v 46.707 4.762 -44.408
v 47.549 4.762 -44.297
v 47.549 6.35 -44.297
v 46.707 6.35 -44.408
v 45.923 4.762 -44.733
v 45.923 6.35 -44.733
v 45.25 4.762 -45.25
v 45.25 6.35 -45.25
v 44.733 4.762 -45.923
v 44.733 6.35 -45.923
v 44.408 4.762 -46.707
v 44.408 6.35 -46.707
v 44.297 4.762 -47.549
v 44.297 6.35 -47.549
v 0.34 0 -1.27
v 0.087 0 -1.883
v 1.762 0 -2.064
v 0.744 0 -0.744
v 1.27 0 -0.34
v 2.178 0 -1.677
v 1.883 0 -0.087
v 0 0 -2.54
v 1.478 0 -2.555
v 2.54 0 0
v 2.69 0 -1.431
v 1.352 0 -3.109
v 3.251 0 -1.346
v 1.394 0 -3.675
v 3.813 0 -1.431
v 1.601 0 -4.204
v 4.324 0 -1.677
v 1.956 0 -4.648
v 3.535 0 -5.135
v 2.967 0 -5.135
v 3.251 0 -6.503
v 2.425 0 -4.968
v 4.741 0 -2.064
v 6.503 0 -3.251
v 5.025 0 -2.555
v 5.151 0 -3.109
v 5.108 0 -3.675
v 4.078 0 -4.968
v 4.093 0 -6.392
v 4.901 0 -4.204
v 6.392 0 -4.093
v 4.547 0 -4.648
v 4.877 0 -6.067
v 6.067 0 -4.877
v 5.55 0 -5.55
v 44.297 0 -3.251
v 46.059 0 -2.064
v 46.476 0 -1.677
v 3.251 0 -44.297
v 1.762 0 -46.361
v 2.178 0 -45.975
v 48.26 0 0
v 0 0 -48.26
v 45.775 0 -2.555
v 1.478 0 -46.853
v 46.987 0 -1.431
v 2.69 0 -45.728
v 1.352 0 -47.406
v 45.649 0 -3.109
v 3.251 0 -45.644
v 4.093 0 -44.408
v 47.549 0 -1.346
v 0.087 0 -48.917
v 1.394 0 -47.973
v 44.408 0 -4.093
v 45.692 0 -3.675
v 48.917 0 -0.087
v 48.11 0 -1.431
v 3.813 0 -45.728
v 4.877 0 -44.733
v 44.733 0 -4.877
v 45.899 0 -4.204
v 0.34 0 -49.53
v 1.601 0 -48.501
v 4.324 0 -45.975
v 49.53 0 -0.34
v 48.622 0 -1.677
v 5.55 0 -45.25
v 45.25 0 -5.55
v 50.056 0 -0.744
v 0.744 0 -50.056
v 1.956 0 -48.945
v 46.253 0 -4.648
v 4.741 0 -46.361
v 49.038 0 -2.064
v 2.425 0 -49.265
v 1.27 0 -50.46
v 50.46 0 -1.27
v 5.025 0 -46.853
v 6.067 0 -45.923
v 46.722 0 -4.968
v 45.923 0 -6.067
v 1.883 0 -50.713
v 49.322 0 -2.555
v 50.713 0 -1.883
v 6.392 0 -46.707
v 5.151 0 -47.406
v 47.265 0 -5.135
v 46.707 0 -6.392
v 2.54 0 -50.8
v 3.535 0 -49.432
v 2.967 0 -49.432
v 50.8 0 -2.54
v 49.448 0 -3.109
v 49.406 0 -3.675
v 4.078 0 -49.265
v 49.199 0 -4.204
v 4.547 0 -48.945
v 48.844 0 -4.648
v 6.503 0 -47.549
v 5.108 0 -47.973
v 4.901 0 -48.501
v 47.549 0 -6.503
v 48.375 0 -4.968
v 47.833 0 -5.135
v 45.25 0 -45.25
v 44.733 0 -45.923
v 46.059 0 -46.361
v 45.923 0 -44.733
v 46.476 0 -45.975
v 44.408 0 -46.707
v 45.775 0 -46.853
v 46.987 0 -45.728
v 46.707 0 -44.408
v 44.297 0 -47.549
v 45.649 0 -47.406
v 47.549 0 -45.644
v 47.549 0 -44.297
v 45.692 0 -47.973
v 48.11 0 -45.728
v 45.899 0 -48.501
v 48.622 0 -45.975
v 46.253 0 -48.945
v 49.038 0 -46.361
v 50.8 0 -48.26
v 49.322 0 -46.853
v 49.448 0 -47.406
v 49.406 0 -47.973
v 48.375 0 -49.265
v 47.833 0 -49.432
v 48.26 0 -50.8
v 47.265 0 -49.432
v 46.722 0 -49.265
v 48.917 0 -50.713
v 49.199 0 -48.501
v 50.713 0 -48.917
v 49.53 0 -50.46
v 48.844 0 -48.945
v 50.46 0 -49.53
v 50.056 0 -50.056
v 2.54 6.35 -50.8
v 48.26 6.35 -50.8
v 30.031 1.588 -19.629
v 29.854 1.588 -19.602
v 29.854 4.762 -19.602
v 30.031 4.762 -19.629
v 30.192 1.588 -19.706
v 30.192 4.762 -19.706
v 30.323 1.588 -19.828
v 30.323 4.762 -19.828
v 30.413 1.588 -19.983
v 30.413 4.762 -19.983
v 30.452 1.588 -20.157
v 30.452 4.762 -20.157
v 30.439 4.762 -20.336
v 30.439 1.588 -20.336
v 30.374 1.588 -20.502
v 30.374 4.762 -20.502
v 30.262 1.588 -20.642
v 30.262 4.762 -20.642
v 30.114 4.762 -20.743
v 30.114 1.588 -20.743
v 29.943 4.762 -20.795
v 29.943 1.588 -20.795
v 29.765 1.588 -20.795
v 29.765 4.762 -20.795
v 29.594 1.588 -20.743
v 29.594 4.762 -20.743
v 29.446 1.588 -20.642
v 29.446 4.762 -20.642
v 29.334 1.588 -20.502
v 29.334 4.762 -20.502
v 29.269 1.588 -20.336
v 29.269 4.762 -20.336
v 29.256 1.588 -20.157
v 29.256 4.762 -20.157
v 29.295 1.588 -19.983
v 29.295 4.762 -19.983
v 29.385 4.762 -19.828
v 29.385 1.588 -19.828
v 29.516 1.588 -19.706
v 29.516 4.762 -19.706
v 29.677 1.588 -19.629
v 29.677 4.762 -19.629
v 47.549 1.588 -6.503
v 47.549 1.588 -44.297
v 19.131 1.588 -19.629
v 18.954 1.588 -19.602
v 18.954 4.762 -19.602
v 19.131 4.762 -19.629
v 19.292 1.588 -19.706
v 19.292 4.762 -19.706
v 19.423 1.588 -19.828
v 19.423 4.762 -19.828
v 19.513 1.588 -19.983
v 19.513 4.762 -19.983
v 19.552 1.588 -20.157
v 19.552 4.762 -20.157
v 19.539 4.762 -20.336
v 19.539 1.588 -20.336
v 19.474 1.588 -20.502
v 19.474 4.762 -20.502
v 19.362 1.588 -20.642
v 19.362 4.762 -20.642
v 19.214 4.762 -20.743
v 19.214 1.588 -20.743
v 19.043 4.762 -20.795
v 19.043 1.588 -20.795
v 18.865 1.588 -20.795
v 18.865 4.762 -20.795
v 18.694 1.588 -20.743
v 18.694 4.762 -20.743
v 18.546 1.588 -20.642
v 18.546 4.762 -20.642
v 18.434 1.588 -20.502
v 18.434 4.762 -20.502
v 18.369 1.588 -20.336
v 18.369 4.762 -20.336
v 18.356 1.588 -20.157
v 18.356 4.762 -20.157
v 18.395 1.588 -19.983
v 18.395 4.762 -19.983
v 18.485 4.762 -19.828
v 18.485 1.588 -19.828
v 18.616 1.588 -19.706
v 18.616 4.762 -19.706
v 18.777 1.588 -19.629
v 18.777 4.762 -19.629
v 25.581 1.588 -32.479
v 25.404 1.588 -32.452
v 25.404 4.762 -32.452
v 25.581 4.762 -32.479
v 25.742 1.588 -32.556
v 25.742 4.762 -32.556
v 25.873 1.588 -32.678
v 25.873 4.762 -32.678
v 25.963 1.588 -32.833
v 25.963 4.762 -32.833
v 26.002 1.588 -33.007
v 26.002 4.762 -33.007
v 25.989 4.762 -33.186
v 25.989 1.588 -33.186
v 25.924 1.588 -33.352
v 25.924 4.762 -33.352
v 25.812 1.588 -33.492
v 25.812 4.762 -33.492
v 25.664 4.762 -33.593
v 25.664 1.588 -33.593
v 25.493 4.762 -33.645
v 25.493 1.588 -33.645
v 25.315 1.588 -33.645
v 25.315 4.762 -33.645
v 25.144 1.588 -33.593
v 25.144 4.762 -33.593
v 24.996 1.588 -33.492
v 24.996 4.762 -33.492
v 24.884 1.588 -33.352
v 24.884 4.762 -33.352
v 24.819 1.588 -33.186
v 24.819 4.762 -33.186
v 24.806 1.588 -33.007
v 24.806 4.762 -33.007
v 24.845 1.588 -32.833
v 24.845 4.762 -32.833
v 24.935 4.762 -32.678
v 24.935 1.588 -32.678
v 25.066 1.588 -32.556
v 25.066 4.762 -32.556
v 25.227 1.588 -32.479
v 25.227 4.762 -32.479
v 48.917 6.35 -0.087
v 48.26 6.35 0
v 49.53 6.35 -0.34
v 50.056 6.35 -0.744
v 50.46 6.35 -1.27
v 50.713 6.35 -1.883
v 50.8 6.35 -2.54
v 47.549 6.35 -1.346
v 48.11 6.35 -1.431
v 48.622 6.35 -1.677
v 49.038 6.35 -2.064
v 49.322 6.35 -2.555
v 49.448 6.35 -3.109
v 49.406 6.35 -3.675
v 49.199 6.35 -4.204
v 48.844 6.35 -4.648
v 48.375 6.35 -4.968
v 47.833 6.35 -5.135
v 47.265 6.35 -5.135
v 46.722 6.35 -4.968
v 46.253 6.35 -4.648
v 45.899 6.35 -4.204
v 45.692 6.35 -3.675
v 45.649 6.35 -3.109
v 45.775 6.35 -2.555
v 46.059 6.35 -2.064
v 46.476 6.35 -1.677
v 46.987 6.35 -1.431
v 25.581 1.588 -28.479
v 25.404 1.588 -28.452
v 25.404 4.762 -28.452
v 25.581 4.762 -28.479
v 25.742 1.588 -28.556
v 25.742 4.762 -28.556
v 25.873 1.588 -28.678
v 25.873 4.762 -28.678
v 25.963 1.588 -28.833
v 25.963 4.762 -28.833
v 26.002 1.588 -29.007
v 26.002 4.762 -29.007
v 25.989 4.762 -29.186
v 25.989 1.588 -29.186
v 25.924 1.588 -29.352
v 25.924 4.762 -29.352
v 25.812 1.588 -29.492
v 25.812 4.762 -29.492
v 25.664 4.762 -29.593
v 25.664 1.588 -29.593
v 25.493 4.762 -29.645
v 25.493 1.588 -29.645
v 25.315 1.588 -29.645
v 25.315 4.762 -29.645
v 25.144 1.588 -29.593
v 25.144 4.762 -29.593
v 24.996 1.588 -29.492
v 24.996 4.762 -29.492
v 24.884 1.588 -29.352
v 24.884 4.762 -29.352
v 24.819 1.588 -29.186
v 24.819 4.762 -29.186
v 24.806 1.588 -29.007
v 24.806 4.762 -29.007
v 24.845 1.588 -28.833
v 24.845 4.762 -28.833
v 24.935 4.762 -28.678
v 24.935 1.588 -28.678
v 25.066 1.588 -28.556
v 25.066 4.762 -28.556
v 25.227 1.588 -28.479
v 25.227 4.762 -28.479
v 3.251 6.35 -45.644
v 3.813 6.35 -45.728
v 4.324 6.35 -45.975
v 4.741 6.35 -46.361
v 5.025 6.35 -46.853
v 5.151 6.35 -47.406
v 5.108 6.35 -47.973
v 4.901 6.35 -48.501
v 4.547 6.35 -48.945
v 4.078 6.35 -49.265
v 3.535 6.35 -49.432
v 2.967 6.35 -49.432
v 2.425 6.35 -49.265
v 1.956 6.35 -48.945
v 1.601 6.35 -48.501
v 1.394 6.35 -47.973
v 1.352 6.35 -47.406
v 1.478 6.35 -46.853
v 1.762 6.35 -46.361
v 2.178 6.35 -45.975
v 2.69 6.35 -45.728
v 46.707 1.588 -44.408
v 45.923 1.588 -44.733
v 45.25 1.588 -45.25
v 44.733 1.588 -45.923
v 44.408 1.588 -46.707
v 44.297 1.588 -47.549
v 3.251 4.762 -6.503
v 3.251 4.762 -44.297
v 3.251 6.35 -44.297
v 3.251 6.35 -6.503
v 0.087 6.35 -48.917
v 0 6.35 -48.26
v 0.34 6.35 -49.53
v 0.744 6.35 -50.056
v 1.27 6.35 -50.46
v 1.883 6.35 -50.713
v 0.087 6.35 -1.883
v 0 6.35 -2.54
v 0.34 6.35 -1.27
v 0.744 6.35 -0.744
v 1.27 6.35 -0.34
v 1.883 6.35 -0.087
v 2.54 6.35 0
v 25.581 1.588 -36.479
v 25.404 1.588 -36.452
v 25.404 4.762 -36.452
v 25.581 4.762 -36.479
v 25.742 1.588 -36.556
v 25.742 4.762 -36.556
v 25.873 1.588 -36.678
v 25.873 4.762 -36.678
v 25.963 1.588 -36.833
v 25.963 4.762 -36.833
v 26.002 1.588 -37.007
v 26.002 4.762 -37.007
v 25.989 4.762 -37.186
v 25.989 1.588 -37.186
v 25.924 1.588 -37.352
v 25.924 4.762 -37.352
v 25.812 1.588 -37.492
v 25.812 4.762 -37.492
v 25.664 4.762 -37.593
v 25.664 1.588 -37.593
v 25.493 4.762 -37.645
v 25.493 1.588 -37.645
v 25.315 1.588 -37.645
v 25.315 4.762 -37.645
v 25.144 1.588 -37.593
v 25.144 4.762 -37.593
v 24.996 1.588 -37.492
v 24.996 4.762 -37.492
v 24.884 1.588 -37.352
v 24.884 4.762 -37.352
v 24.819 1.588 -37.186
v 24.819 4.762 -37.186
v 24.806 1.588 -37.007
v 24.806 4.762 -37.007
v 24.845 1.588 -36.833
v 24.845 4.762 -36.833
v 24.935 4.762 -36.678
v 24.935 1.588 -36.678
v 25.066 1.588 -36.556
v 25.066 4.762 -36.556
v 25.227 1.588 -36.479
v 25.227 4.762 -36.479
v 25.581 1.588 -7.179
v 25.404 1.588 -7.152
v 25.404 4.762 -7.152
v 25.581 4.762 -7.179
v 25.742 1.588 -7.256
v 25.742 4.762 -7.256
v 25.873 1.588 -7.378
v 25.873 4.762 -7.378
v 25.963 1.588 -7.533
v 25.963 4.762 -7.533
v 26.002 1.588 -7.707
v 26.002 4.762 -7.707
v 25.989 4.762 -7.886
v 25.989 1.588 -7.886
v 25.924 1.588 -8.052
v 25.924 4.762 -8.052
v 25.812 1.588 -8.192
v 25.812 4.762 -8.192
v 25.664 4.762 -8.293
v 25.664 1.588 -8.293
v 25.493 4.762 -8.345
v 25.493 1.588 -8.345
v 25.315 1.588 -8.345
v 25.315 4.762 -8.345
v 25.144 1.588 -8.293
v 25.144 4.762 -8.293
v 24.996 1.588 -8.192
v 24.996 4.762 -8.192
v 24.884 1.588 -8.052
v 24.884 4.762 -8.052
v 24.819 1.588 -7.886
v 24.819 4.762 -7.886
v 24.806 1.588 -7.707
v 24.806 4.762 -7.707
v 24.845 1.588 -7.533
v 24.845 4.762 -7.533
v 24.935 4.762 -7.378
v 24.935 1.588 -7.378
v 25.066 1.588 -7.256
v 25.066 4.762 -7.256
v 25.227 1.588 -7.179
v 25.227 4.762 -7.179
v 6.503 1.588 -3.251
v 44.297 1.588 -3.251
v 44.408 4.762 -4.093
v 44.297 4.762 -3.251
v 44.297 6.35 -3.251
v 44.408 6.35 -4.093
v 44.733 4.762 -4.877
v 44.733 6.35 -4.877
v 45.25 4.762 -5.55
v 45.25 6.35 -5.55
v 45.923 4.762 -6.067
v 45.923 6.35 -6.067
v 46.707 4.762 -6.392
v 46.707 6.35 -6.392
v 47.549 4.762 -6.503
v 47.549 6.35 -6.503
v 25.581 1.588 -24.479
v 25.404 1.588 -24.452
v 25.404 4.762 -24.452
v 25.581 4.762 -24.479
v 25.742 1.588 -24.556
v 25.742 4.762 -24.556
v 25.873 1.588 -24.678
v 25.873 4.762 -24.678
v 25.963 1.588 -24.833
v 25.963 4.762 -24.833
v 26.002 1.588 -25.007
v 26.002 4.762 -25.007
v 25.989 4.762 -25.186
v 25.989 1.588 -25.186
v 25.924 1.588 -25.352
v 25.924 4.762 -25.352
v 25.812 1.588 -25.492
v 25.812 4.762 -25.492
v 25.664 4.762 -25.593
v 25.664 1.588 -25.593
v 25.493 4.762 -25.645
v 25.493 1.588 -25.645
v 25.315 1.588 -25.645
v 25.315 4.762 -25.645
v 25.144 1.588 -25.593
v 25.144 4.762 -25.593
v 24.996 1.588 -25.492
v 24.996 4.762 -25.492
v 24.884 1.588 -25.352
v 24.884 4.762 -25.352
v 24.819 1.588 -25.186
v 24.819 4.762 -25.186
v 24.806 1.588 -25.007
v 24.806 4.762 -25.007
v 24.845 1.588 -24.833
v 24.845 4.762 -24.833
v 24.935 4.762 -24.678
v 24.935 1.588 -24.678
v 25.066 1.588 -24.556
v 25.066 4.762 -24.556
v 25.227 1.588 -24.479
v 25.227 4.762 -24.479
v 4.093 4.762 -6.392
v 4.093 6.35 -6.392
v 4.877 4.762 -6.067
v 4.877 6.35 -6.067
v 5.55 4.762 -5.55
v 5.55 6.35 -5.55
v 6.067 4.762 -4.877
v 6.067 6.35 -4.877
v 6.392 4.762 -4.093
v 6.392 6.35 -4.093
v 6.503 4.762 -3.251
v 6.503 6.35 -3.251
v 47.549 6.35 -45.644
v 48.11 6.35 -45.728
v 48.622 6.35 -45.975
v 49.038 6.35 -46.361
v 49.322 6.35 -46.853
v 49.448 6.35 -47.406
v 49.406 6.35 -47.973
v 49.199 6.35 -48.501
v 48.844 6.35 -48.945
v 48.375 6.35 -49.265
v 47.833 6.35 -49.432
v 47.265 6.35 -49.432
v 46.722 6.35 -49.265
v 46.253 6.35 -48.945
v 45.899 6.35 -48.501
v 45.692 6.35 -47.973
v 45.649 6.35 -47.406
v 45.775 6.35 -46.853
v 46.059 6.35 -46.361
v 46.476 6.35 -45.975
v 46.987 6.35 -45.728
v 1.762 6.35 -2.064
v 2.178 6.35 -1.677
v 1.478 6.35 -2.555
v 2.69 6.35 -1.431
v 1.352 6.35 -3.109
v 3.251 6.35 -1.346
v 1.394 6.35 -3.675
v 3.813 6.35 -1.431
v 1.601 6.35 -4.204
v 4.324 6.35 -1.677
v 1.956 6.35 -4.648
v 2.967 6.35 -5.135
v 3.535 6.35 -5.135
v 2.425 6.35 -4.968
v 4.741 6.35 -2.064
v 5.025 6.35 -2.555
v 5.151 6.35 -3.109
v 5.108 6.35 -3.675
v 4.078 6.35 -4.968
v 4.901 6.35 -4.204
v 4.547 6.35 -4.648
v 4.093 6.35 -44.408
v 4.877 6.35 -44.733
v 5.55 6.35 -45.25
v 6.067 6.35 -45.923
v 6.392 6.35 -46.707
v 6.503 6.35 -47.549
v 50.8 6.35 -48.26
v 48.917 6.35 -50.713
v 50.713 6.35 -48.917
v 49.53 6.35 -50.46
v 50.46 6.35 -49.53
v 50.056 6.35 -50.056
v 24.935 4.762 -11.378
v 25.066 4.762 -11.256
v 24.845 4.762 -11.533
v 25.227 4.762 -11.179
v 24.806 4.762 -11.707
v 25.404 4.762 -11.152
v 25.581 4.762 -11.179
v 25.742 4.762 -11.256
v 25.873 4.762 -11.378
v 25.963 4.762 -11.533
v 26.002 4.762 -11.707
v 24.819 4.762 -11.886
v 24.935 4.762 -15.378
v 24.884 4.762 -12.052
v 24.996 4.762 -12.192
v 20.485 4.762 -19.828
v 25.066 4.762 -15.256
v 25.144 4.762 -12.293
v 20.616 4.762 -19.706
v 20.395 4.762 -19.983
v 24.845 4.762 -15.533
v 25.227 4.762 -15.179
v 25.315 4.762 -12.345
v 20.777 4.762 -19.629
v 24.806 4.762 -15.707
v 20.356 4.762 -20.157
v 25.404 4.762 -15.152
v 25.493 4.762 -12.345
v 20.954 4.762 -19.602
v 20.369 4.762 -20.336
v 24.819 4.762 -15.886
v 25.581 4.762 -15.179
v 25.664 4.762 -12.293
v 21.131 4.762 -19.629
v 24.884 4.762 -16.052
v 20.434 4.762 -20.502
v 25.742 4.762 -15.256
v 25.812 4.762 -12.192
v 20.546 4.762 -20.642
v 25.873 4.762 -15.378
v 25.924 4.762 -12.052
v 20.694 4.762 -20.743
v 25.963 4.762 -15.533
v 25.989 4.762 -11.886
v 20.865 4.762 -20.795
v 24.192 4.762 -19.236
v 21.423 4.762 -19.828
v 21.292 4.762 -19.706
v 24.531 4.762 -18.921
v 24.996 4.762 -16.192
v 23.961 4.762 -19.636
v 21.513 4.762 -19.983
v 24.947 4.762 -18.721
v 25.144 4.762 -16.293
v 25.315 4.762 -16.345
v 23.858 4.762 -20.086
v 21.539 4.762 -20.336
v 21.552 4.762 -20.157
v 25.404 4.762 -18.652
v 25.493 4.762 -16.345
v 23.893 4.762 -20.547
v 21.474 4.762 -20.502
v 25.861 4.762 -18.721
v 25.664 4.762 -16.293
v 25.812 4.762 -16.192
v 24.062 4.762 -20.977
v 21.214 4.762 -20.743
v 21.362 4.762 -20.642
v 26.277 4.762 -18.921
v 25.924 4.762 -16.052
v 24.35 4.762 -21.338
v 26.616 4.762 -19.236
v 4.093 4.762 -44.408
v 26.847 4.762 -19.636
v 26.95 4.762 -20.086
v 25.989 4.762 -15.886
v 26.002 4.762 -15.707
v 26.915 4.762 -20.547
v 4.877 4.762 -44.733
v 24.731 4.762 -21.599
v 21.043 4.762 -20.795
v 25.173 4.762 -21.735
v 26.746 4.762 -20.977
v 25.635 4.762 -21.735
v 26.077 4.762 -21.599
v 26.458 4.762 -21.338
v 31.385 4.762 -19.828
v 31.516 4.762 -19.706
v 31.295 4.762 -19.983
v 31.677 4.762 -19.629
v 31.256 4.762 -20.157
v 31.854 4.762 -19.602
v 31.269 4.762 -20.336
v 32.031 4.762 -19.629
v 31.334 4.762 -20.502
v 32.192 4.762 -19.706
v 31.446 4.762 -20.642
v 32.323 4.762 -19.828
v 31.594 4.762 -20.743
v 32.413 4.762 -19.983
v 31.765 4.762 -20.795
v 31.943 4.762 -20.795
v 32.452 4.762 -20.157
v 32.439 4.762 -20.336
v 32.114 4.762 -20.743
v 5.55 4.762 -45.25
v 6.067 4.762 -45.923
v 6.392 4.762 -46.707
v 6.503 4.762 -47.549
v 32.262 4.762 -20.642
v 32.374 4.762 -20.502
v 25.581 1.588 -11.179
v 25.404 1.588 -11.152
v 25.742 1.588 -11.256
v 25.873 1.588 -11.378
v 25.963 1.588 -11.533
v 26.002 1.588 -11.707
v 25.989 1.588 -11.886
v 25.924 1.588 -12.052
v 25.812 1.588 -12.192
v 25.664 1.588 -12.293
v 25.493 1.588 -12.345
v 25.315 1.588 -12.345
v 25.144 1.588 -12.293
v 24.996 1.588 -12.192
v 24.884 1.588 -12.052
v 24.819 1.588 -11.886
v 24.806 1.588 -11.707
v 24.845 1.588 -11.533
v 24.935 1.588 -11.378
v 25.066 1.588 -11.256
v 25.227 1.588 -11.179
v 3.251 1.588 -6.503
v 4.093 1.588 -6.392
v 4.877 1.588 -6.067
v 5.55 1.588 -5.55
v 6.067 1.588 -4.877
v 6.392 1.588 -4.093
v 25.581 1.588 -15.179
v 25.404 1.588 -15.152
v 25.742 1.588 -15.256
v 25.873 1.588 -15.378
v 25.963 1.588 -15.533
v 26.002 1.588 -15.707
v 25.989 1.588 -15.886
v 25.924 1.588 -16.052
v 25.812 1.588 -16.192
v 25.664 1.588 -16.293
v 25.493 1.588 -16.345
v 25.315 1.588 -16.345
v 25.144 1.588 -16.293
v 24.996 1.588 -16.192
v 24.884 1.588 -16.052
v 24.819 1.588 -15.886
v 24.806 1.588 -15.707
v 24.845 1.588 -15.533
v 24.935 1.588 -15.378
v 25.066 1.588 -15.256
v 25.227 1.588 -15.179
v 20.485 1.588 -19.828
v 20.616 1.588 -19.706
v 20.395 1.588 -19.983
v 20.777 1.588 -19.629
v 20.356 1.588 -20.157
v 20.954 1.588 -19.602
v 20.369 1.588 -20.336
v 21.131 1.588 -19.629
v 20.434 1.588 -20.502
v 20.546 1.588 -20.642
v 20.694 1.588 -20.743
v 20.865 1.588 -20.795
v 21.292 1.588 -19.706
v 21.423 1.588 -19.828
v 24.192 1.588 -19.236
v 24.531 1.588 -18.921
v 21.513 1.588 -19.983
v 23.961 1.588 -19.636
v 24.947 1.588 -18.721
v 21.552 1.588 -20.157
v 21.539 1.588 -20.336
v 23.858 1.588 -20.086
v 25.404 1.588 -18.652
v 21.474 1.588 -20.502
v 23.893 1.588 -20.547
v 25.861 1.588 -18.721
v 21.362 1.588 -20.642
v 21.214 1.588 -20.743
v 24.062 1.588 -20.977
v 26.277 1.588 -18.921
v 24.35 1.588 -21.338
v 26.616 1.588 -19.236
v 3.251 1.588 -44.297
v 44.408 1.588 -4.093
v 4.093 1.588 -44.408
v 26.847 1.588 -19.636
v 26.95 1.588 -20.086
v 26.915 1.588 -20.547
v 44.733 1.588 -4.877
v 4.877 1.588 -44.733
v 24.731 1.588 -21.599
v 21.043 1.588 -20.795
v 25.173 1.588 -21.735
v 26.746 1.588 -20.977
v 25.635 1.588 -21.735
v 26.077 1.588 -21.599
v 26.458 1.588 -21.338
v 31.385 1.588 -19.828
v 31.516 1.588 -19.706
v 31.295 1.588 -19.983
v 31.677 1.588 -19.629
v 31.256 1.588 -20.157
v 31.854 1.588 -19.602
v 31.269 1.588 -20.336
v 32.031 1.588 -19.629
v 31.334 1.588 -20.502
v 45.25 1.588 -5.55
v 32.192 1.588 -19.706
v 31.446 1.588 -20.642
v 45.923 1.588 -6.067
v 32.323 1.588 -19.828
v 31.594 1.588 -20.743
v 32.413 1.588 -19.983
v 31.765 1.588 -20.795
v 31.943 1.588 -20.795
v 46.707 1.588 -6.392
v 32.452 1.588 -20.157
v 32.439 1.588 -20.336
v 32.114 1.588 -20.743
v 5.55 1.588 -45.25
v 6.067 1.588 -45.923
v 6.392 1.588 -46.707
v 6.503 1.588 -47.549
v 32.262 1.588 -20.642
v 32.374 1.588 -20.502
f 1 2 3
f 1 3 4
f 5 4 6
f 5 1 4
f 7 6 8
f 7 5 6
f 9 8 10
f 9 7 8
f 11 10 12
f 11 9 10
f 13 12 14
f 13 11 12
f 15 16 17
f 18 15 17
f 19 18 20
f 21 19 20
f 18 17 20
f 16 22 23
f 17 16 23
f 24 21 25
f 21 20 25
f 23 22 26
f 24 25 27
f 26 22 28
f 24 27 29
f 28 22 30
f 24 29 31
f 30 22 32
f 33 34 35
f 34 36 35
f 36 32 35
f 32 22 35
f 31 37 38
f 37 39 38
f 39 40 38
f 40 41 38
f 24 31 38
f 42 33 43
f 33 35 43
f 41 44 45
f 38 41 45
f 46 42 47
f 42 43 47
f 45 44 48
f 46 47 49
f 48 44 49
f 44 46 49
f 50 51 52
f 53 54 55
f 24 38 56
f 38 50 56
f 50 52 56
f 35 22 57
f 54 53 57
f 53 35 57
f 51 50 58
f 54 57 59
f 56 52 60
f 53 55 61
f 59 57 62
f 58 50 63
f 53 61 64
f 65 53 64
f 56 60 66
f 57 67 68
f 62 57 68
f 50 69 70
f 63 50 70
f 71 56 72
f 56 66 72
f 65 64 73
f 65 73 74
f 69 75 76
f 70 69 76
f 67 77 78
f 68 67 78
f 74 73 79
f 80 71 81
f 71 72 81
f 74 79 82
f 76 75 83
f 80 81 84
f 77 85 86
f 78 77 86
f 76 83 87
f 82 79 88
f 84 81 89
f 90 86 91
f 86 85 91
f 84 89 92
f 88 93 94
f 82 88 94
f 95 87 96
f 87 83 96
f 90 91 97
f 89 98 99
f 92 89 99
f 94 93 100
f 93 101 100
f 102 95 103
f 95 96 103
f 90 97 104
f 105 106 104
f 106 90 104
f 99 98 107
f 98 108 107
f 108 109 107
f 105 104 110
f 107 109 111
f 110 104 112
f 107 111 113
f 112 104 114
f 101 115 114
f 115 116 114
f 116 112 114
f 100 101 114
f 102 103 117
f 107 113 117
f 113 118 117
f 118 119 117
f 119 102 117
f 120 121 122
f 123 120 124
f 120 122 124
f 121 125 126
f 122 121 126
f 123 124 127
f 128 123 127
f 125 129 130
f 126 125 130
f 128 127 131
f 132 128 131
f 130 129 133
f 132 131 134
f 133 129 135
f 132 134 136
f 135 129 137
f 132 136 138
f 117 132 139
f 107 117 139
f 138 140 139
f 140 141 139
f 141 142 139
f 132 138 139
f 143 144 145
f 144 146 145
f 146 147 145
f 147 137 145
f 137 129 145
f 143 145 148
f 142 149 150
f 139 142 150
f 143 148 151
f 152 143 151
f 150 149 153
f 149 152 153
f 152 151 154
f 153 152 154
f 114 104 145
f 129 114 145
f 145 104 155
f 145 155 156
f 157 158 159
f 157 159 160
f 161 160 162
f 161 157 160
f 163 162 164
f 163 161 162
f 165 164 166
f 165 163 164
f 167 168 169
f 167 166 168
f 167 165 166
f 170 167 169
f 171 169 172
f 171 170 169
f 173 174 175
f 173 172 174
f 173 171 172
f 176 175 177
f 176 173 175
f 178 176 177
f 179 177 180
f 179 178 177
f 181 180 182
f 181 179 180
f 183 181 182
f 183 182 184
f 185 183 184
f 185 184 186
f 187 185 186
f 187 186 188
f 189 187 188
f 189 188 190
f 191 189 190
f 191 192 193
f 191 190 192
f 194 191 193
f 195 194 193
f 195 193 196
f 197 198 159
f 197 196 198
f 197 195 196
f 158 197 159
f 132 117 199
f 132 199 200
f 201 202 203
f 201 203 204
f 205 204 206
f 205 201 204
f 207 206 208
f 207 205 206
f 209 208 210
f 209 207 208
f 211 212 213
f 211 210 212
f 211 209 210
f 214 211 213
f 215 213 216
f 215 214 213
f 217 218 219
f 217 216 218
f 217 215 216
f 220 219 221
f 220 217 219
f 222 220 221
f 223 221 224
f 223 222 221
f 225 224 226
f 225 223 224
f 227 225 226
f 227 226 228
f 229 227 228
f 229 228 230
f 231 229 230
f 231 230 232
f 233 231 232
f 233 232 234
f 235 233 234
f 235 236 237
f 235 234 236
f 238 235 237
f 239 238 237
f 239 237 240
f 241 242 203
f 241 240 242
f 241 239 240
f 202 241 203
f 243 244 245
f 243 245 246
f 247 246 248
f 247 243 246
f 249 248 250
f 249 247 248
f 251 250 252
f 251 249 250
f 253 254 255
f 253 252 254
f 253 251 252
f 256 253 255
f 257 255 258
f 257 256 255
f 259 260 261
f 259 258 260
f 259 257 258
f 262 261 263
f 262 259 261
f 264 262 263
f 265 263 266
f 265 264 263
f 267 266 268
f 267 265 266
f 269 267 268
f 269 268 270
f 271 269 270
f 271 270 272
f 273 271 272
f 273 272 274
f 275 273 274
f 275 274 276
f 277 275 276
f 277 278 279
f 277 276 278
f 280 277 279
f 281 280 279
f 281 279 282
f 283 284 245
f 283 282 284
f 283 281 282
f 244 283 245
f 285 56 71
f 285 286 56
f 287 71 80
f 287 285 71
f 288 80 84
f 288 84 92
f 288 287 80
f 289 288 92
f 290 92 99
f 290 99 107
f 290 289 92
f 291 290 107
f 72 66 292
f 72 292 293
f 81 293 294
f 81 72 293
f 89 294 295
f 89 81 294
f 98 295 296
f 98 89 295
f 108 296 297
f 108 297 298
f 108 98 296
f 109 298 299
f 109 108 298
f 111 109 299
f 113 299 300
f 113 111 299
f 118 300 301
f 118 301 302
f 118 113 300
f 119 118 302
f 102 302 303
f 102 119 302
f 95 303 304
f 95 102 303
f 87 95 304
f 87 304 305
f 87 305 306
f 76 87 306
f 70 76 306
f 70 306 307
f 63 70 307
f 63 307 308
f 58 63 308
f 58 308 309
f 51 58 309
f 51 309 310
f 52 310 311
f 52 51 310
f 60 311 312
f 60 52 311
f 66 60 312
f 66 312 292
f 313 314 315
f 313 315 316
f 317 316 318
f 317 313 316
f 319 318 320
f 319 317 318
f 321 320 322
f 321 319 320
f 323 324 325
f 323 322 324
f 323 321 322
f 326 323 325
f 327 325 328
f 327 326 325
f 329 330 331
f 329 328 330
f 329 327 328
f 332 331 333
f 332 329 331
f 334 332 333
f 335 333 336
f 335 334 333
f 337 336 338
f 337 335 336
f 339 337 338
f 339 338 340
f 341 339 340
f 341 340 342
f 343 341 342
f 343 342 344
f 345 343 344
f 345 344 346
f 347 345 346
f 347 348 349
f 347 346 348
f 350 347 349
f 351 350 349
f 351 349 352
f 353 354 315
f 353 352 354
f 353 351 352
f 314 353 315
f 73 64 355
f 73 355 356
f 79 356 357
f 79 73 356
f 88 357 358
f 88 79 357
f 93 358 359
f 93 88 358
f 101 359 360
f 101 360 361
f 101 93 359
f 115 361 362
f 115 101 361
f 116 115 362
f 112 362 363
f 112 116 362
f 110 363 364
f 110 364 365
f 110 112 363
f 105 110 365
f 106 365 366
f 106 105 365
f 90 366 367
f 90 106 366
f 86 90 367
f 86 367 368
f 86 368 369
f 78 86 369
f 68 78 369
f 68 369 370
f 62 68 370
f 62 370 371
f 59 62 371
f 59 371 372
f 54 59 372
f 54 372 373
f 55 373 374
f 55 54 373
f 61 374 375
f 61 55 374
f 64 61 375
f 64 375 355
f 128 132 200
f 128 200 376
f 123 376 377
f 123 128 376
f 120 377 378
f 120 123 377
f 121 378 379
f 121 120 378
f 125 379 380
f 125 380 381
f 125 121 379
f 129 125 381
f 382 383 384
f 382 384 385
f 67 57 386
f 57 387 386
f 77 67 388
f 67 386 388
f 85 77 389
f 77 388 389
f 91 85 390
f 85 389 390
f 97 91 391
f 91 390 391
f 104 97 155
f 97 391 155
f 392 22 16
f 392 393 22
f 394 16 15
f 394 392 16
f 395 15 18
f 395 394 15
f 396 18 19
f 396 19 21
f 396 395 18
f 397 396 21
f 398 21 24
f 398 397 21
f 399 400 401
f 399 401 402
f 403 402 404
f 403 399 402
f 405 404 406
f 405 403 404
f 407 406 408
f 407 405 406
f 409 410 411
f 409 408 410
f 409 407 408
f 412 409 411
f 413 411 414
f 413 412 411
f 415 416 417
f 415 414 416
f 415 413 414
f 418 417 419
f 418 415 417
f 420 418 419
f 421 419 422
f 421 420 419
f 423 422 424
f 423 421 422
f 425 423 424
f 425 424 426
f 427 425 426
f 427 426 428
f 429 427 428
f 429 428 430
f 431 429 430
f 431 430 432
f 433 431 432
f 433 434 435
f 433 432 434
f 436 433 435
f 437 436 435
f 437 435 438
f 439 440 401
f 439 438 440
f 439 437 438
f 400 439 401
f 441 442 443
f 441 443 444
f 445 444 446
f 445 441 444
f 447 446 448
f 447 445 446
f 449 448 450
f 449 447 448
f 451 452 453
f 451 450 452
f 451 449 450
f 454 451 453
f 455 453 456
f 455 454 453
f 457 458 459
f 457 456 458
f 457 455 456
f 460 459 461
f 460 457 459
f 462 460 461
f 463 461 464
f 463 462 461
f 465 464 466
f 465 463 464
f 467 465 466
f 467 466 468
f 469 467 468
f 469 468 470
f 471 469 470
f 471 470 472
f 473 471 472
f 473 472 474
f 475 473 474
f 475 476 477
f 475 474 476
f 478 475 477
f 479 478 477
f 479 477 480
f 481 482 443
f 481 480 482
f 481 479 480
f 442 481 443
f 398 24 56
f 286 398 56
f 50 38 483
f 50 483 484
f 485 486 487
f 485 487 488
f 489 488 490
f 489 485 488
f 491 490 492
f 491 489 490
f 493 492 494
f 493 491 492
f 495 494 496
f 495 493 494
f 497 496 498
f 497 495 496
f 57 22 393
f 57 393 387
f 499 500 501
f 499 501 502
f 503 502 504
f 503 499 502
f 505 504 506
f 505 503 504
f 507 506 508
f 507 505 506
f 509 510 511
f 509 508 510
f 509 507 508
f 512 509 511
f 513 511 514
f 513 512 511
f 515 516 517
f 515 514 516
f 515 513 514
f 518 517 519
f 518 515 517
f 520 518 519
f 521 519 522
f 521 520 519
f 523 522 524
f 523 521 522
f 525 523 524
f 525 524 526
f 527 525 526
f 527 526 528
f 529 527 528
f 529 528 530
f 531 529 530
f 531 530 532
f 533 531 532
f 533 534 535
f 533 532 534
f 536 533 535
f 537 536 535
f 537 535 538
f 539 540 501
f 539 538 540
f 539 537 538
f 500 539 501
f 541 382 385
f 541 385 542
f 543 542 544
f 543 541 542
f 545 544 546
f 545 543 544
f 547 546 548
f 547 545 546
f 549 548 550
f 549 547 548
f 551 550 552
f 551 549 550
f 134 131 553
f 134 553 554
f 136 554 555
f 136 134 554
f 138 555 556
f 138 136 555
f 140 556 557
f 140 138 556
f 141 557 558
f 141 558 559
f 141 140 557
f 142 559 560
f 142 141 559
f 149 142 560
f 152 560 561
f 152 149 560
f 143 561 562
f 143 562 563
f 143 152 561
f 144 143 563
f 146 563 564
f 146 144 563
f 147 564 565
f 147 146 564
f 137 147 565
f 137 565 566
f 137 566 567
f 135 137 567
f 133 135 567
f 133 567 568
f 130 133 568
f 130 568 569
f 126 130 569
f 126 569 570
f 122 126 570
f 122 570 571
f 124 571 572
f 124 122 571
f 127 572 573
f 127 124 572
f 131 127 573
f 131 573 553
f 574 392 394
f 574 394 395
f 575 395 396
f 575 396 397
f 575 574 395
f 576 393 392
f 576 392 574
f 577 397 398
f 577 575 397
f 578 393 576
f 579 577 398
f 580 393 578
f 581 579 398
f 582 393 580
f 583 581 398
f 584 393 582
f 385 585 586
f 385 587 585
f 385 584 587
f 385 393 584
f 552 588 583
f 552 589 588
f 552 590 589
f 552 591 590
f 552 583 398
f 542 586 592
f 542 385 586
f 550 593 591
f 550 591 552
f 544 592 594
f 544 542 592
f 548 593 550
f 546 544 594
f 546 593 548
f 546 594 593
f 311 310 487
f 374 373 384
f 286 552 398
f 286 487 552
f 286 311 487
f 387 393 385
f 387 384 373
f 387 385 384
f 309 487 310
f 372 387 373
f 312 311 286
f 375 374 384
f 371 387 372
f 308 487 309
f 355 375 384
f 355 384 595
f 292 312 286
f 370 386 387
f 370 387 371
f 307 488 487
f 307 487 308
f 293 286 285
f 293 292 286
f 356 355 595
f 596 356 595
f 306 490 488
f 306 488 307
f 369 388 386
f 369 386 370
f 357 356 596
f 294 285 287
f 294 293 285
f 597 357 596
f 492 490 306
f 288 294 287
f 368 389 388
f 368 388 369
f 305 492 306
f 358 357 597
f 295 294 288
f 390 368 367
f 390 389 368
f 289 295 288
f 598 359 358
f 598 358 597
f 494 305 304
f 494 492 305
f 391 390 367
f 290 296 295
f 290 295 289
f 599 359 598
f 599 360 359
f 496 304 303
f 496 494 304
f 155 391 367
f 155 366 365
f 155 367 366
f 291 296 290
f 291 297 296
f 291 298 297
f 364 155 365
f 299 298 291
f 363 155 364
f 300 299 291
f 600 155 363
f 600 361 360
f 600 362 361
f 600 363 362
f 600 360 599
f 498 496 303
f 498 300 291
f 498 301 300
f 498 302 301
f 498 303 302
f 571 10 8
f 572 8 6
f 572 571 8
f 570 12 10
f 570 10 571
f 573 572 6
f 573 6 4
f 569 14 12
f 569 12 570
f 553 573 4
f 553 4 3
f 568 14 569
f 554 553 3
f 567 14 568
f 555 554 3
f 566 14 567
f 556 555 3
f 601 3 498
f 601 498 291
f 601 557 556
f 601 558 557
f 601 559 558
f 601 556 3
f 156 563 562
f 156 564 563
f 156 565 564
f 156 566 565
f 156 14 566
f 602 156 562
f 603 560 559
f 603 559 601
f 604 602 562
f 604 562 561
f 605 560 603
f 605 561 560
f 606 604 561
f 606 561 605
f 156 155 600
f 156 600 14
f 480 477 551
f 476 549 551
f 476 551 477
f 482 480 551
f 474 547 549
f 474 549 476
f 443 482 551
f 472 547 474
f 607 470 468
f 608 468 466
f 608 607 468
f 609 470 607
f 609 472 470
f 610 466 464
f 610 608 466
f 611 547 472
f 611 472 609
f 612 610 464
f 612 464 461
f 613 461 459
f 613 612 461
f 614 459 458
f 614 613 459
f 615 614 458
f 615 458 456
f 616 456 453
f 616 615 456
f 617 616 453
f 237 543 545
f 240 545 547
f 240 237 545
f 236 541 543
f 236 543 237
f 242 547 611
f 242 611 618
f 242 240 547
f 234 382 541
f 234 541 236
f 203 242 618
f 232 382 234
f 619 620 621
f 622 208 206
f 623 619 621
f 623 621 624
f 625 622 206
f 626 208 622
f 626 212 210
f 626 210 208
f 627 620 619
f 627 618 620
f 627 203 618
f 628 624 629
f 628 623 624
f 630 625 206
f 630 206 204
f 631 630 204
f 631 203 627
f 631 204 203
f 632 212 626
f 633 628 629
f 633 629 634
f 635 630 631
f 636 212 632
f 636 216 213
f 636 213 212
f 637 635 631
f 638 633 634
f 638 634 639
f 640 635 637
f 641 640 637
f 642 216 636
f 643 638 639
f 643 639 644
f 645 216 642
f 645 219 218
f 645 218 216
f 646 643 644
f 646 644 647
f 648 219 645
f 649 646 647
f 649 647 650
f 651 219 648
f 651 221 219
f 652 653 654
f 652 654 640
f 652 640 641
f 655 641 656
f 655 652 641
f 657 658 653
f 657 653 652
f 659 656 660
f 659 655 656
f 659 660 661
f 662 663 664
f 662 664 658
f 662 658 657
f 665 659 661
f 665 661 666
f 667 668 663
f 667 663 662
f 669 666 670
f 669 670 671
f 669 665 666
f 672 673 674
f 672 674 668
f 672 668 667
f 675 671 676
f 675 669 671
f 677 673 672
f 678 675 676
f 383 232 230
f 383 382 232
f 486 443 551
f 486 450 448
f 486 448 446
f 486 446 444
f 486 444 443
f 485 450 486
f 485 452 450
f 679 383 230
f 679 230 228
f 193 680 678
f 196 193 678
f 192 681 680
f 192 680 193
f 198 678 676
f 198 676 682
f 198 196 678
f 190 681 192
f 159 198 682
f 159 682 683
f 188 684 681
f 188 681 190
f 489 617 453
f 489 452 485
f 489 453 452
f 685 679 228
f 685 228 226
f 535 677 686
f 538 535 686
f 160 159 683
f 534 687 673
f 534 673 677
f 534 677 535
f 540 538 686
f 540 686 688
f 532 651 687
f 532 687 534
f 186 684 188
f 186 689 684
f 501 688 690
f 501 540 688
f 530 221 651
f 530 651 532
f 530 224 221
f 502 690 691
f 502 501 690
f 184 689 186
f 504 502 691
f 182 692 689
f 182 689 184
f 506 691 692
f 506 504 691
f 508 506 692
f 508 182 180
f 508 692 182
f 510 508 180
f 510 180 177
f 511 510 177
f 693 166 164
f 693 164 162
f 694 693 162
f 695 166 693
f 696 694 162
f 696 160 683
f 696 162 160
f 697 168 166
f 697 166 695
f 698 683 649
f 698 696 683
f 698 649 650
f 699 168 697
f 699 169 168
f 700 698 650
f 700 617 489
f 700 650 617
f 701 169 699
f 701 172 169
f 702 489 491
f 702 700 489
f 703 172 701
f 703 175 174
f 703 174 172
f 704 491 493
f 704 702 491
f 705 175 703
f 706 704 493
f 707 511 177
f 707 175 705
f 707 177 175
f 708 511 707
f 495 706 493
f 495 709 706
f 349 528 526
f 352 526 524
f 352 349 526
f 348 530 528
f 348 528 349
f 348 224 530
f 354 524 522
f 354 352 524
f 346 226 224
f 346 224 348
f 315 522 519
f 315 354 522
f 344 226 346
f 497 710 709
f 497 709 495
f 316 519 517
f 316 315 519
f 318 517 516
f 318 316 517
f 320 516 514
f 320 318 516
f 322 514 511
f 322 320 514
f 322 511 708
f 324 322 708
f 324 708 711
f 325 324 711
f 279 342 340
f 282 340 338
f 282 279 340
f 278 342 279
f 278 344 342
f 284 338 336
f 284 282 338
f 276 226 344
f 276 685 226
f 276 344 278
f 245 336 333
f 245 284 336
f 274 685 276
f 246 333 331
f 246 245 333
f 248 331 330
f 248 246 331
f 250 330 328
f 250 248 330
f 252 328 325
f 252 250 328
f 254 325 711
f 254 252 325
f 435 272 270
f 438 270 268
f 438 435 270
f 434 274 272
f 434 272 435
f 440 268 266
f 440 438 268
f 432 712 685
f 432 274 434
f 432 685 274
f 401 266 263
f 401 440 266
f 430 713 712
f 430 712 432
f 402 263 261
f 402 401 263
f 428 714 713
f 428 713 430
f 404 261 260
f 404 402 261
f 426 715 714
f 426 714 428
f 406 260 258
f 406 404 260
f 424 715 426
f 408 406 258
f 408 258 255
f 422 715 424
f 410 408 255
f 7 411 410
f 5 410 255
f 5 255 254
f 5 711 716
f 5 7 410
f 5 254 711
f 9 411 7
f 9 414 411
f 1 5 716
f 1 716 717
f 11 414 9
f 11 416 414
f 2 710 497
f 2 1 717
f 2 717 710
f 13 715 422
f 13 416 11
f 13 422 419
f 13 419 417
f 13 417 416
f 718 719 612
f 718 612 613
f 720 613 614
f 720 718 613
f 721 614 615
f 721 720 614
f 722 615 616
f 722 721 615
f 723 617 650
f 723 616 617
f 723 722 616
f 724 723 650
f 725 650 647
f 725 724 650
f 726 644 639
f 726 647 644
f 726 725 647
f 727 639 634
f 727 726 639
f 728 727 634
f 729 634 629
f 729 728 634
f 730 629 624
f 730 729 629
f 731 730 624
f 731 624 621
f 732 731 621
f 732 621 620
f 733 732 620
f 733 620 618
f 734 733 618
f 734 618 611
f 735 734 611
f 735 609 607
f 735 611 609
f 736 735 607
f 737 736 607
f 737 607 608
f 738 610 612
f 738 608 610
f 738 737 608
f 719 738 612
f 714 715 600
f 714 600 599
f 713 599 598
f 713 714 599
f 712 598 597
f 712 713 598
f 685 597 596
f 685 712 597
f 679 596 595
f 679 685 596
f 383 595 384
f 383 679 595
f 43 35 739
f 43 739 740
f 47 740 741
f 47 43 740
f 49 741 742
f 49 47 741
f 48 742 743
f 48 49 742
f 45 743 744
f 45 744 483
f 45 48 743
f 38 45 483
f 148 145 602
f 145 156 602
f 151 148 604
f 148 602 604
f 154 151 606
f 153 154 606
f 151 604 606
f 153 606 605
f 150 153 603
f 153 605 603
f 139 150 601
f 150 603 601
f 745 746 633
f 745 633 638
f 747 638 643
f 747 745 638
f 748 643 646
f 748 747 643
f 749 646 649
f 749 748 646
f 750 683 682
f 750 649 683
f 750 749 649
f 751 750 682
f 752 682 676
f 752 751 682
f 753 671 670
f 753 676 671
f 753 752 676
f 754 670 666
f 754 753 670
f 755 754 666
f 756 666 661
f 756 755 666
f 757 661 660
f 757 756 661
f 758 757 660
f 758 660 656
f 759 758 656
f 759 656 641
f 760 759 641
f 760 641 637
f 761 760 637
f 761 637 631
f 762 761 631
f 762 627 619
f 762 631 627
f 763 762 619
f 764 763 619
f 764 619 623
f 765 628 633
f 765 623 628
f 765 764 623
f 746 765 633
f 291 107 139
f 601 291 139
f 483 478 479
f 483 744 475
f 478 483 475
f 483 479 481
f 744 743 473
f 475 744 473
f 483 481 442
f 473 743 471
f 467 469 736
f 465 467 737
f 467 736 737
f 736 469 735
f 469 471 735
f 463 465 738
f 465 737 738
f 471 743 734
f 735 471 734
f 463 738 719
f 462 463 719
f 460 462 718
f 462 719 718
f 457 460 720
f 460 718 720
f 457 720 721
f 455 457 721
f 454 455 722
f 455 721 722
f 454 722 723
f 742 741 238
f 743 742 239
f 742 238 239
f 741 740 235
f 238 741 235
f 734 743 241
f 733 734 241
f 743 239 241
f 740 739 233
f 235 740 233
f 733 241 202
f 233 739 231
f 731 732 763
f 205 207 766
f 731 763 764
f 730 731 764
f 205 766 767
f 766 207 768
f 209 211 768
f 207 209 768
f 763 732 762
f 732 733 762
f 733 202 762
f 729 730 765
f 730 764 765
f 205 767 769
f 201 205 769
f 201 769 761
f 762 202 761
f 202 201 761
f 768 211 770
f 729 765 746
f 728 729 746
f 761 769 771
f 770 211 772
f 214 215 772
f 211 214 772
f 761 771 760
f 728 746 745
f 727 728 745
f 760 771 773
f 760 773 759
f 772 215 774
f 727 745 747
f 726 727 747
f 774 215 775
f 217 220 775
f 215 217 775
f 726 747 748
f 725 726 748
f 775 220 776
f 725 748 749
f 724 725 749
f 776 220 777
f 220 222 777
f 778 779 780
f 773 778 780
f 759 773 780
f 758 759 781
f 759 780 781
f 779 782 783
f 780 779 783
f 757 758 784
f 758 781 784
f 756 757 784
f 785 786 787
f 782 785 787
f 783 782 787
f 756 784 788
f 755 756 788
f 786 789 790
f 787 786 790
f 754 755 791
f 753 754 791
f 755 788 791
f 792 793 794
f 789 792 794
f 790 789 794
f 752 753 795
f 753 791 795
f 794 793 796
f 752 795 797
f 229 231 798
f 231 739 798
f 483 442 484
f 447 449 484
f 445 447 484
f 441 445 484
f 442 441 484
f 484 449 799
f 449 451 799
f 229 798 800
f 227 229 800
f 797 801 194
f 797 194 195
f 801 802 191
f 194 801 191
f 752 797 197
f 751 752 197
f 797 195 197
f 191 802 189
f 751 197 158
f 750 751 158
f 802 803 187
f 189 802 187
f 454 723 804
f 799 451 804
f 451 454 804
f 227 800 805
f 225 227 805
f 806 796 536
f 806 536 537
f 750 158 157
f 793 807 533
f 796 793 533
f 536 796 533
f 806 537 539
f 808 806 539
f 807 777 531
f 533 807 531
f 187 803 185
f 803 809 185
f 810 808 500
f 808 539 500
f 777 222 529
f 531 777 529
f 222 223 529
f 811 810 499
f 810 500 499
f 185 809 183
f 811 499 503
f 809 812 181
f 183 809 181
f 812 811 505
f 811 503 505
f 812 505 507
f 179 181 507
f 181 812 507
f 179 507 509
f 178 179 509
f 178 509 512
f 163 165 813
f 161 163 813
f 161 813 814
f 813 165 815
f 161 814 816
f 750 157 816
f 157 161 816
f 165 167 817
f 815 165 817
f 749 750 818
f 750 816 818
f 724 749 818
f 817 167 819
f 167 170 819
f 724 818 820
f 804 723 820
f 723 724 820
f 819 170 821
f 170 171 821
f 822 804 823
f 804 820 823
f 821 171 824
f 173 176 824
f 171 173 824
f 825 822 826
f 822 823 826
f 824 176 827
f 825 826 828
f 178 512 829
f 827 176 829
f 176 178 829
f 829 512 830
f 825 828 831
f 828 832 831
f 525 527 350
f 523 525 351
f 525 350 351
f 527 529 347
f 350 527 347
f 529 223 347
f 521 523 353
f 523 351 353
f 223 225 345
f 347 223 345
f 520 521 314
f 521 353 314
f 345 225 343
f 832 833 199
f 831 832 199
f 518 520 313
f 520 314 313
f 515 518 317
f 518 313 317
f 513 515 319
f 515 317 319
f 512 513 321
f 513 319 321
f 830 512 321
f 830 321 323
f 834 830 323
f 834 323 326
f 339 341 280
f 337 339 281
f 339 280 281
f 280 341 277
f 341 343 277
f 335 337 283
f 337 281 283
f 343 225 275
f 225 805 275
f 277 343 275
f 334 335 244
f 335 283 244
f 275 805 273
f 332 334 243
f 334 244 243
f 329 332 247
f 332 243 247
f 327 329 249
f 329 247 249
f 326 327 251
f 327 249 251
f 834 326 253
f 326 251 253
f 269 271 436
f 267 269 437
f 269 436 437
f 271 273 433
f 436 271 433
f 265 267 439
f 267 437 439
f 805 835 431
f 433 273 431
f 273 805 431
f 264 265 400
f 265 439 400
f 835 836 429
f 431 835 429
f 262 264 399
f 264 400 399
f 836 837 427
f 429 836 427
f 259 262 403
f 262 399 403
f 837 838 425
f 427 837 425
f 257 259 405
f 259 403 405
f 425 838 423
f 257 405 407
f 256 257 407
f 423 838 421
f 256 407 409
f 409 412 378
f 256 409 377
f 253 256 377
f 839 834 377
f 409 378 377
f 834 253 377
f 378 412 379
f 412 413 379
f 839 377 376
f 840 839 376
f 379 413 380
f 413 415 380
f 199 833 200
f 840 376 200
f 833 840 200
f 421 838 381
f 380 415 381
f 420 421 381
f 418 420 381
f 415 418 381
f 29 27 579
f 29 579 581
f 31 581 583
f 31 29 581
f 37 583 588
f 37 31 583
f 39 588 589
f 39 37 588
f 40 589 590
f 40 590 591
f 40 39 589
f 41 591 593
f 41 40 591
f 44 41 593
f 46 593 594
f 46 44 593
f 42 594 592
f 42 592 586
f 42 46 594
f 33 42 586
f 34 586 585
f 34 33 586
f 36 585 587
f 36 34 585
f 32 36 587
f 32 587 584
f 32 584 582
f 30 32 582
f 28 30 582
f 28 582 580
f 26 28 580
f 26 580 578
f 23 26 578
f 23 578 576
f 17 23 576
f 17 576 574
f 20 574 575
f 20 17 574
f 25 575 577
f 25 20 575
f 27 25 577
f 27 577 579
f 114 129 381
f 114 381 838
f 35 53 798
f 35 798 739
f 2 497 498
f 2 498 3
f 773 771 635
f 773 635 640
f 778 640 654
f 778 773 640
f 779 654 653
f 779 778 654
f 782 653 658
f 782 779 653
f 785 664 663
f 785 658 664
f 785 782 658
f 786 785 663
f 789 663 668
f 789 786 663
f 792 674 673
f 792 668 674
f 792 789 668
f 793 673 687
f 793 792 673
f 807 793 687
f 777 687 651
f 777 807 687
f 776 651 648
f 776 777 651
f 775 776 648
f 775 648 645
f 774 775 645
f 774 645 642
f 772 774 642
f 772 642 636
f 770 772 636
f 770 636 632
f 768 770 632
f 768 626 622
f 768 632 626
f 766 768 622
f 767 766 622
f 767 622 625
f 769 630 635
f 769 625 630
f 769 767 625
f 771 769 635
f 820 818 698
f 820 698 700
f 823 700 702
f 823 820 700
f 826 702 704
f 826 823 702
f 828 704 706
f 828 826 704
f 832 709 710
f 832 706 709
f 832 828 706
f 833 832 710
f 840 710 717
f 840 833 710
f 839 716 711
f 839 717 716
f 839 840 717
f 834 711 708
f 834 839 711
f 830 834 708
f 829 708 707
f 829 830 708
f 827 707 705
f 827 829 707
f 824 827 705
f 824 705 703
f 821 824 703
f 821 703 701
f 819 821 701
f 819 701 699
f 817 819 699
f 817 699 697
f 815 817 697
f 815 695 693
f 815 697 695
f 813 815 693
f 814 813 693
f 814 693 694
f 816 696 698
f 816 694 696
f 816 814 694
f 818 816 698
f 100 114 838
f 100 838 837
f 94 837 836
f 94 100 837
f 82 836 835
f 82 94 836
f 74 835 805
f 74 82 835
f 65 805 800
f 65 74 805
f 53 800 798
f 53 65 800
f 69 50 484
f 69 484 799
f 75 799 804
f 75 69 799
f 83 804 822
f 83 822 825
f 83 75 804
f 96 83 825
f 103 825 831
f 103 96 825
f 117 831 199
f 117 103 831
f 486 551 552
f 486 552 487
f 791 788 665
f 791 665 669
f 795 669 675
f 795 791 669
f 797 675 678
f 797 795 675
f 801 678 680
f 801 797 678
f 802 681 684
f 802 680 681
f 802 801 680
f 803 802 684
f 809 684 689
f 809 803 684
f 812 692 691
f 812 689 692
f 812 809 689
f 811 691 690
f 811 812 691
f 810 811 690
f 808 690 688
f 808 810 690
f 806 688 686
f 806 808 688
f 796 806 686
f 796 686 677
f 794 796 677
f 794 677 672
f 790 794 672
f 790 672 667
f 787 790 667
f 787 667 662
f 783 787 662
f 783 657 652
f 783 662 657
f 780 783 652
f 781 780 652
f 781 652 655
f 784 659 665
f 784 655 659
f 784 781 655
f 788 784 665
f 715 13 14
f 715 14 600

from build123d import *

# Parameters (mm, degrees)
SKETCH1_W           = 50.8
SKETCH1_H           = 50.8
SKETCH1_R           = 1.905
SKETCH1_R_2         = 0.6
SKETCH1_R_3         = 1.55
BOSS_EXTRUDE1_DEPTH = 6.35
CUT_EXTRUDE1_DEPTH  = 1.5875
CUT_EXTRUDE2_START  = 4.7625
CUT_EXTRUDE2_DEPTH  = 1.5875
FILLET1_R           = 2.54


with BuildPart() as part:
    # Sketch1 → Boss-Extrude1 (new body)
    with BuildSketch(Plane(origin=(0, 0, 0), x_dir=(1, 0, 0), z_dir=(0, 1, 0))):
        with Locations((25.4, 25.4)):
            Rectangle(SKETCH1_W, SKETCH1_H)
        with Locations(Location((3.251252547, 47.548747453, 0), (0, 0, 270))):
            Circle(SKETCH1_R, mode=Mode.SUBTRACT)
        with Locations(Location((3.251252547, 3.251252547, 0), (0, 0, 270))):
            Circle(SKETCH1_R, mode=Mode.SUBTRACT)
        with Locations(Location((47.548747453, 3.251252547, 0), (0, 0, 270))):
            Circle(SKETCH1_R, mode=Mode.SUBTRACT)
        with Locations(Location((47.548747453, 47.548747453, 0), (0, 0, 270))):
            Circle(SKETCH1_R, mode=Mode.SUBTRACT)
        with Locations(Location((25.404, 11.752, 0), (0, 0, 270))):
            Circle(SKETCH1_R_2, mode=Mode.SUBTRACT)
        with Locations(Location((18.954, 20.202, 0), (0, 0, 270))):
            Circle(SKETCH1_R_2, mode=Mode.SUBTRACT)
        with Locations(Location((20.954, 20.202, 0), (0, 0, 270))):
            Circle(SKETCH1_R_2, mode=Mode.SUBTRACT)
        with Locations(Location((31.854, 20.202, 0), (0, 0, 270))):
            Circle(SKETCH1_R_2, mode=Mode.SUBTRACT)
        with Locations(Location((29.854, 20.202, 0), (0, 0, 270))):
            Circle(SKETCH1_R_2, mode=Mode.SUBTRACT)
        with Locations(Location((25.404, 37.052, 0), (0, 0, 270))):
            Circle(SKETCH1_R_2, mode=Mode.SUBTRACT)
        with Locations(Location((25.404, 33.052, 0), (0, 0, 270))):
            Circle(SKETCH1_R_2, mode=Mode.SUBTRACT)
        with Locations(Location((25.404, 29.052, 0), (0, 0, 270))):
            Circle(SKETCH1_R_2, mode=Mode.SUBTRACT)
        with Locations(Location((25.404, 25.052, 0), (0, 0, 270))):
            Circle(SKETCH1_R_2, mode=Mode.SUBTRACT)
        with Locations(Location((25.404, 7.752, 0), (0, 0, 270))):
            Circle(SKETCH1_R_2, mode=Mode.SUBTRACT)
        with Locations(Location((25.404, 15.752, 0), (0, 0, 270))):
            Circle(SKETCH1_R_2, mode=Mode.SUBTRACT)
        with Locations(Location((25.404, 20.202, 0), (0, 0, 270))):
            Circle(SKETCH1_R_3, mode=Mode.SUBTRACT)
    extrude(amount=BOSS_EXTRUDE1_DEPTH)

    # Sketch2 → Cut-Extrude1 (cut)
    with BuildSketch(Plane(origin=(0, 0, 0), x_dir=(1, 0, 0), z_dir=(0, 1, 0))):
        with BuildLine():
            ThreePointArc((6.502505094, 47.548747453), (5.55023527, 45.24976473), (3.251252547, 44.297494906))
            Line((3.251252547, 44.297494906), (3.251252547, 6.502505094))
            ThreePointArc((3.251252547, 6.502505094), (5.55023527, 5.55023527), (6.502505094, 3.251252547))
            Line((6.502505094, 3.251252547), (44.297494906, 3.251252547))
            ThreePointArc((44.297494906, 3.251252547), (45.24976473, 5.55023527), (47.548747453, 6.502505094))
            Line((47.548747453, 6.502505094), (47.548747453, 44.297494906))
            ThreePointArc((47.548747453, 44.297494906), (45.24976473, 45.24976473), (44.297494906, 47.548747453))
            Line((44.297494906, 47.548747453), (6.502505094, 47.548747453))
        make_face()
    extrude(amount=CUT_EXTRUDE1_DEPTH, mode=Mode.SUBTRACT)

    # Sketch3 → Cut-Extrude2 (cut)
    with BuildSketch(Plane(origin=(0, 0, 0), x_dir=(1, 0, 0), z_dir=(0, 1, 0)).offset(CUT_EXTRUDE2_START)):
        with BuildLine():
            ThreePointArc((6.502505094, 47.548747453), (5.55023527, 45.24976473), (3.251252547, 44.297494906))
            Line((3.251252547, 44.297494906), (3.251252547, 6.502505094))
            ThreePointArc((3.251252547, 6.502505094), (5.55023527, 5.55023527), (6.502505094, 3.251252547))
            Line((6.502505094, 3.251252547), (44.297494906, 3.251252547))
            ThreePointArc((44.297494906, 3.251252547), (45.24976473, 5.55023527), (47.548747453, 6.502505094))
            Line((47.548747453, 6.502505094), (47.548747453, 44.297494906))
            ThreePointArc((47.548747453, 44.297494906), (45.24976473, 45.24976473), (44.297494906, 47.548747453))
            Line((44.297494906, 47.548747453), (6.502505094, 47.548747453))
        make_face()
    extrude(amount=CUT_EXTRUDE2_DEPTH, mode=Mode.SUBTRACT)

    # Fillet1
    fillet1_edges = [part.edges().sort_by_distance(p)[0] for p in [
        (50.8, 3.175, -50.8),
        (50.8, 3.175, 0),
        (0, 3.175, 0),
        (0, 3.175, -50.8),
    ]]
    fillet(fillet1_edges, radius=FILLET1_R)


solid = part.part
